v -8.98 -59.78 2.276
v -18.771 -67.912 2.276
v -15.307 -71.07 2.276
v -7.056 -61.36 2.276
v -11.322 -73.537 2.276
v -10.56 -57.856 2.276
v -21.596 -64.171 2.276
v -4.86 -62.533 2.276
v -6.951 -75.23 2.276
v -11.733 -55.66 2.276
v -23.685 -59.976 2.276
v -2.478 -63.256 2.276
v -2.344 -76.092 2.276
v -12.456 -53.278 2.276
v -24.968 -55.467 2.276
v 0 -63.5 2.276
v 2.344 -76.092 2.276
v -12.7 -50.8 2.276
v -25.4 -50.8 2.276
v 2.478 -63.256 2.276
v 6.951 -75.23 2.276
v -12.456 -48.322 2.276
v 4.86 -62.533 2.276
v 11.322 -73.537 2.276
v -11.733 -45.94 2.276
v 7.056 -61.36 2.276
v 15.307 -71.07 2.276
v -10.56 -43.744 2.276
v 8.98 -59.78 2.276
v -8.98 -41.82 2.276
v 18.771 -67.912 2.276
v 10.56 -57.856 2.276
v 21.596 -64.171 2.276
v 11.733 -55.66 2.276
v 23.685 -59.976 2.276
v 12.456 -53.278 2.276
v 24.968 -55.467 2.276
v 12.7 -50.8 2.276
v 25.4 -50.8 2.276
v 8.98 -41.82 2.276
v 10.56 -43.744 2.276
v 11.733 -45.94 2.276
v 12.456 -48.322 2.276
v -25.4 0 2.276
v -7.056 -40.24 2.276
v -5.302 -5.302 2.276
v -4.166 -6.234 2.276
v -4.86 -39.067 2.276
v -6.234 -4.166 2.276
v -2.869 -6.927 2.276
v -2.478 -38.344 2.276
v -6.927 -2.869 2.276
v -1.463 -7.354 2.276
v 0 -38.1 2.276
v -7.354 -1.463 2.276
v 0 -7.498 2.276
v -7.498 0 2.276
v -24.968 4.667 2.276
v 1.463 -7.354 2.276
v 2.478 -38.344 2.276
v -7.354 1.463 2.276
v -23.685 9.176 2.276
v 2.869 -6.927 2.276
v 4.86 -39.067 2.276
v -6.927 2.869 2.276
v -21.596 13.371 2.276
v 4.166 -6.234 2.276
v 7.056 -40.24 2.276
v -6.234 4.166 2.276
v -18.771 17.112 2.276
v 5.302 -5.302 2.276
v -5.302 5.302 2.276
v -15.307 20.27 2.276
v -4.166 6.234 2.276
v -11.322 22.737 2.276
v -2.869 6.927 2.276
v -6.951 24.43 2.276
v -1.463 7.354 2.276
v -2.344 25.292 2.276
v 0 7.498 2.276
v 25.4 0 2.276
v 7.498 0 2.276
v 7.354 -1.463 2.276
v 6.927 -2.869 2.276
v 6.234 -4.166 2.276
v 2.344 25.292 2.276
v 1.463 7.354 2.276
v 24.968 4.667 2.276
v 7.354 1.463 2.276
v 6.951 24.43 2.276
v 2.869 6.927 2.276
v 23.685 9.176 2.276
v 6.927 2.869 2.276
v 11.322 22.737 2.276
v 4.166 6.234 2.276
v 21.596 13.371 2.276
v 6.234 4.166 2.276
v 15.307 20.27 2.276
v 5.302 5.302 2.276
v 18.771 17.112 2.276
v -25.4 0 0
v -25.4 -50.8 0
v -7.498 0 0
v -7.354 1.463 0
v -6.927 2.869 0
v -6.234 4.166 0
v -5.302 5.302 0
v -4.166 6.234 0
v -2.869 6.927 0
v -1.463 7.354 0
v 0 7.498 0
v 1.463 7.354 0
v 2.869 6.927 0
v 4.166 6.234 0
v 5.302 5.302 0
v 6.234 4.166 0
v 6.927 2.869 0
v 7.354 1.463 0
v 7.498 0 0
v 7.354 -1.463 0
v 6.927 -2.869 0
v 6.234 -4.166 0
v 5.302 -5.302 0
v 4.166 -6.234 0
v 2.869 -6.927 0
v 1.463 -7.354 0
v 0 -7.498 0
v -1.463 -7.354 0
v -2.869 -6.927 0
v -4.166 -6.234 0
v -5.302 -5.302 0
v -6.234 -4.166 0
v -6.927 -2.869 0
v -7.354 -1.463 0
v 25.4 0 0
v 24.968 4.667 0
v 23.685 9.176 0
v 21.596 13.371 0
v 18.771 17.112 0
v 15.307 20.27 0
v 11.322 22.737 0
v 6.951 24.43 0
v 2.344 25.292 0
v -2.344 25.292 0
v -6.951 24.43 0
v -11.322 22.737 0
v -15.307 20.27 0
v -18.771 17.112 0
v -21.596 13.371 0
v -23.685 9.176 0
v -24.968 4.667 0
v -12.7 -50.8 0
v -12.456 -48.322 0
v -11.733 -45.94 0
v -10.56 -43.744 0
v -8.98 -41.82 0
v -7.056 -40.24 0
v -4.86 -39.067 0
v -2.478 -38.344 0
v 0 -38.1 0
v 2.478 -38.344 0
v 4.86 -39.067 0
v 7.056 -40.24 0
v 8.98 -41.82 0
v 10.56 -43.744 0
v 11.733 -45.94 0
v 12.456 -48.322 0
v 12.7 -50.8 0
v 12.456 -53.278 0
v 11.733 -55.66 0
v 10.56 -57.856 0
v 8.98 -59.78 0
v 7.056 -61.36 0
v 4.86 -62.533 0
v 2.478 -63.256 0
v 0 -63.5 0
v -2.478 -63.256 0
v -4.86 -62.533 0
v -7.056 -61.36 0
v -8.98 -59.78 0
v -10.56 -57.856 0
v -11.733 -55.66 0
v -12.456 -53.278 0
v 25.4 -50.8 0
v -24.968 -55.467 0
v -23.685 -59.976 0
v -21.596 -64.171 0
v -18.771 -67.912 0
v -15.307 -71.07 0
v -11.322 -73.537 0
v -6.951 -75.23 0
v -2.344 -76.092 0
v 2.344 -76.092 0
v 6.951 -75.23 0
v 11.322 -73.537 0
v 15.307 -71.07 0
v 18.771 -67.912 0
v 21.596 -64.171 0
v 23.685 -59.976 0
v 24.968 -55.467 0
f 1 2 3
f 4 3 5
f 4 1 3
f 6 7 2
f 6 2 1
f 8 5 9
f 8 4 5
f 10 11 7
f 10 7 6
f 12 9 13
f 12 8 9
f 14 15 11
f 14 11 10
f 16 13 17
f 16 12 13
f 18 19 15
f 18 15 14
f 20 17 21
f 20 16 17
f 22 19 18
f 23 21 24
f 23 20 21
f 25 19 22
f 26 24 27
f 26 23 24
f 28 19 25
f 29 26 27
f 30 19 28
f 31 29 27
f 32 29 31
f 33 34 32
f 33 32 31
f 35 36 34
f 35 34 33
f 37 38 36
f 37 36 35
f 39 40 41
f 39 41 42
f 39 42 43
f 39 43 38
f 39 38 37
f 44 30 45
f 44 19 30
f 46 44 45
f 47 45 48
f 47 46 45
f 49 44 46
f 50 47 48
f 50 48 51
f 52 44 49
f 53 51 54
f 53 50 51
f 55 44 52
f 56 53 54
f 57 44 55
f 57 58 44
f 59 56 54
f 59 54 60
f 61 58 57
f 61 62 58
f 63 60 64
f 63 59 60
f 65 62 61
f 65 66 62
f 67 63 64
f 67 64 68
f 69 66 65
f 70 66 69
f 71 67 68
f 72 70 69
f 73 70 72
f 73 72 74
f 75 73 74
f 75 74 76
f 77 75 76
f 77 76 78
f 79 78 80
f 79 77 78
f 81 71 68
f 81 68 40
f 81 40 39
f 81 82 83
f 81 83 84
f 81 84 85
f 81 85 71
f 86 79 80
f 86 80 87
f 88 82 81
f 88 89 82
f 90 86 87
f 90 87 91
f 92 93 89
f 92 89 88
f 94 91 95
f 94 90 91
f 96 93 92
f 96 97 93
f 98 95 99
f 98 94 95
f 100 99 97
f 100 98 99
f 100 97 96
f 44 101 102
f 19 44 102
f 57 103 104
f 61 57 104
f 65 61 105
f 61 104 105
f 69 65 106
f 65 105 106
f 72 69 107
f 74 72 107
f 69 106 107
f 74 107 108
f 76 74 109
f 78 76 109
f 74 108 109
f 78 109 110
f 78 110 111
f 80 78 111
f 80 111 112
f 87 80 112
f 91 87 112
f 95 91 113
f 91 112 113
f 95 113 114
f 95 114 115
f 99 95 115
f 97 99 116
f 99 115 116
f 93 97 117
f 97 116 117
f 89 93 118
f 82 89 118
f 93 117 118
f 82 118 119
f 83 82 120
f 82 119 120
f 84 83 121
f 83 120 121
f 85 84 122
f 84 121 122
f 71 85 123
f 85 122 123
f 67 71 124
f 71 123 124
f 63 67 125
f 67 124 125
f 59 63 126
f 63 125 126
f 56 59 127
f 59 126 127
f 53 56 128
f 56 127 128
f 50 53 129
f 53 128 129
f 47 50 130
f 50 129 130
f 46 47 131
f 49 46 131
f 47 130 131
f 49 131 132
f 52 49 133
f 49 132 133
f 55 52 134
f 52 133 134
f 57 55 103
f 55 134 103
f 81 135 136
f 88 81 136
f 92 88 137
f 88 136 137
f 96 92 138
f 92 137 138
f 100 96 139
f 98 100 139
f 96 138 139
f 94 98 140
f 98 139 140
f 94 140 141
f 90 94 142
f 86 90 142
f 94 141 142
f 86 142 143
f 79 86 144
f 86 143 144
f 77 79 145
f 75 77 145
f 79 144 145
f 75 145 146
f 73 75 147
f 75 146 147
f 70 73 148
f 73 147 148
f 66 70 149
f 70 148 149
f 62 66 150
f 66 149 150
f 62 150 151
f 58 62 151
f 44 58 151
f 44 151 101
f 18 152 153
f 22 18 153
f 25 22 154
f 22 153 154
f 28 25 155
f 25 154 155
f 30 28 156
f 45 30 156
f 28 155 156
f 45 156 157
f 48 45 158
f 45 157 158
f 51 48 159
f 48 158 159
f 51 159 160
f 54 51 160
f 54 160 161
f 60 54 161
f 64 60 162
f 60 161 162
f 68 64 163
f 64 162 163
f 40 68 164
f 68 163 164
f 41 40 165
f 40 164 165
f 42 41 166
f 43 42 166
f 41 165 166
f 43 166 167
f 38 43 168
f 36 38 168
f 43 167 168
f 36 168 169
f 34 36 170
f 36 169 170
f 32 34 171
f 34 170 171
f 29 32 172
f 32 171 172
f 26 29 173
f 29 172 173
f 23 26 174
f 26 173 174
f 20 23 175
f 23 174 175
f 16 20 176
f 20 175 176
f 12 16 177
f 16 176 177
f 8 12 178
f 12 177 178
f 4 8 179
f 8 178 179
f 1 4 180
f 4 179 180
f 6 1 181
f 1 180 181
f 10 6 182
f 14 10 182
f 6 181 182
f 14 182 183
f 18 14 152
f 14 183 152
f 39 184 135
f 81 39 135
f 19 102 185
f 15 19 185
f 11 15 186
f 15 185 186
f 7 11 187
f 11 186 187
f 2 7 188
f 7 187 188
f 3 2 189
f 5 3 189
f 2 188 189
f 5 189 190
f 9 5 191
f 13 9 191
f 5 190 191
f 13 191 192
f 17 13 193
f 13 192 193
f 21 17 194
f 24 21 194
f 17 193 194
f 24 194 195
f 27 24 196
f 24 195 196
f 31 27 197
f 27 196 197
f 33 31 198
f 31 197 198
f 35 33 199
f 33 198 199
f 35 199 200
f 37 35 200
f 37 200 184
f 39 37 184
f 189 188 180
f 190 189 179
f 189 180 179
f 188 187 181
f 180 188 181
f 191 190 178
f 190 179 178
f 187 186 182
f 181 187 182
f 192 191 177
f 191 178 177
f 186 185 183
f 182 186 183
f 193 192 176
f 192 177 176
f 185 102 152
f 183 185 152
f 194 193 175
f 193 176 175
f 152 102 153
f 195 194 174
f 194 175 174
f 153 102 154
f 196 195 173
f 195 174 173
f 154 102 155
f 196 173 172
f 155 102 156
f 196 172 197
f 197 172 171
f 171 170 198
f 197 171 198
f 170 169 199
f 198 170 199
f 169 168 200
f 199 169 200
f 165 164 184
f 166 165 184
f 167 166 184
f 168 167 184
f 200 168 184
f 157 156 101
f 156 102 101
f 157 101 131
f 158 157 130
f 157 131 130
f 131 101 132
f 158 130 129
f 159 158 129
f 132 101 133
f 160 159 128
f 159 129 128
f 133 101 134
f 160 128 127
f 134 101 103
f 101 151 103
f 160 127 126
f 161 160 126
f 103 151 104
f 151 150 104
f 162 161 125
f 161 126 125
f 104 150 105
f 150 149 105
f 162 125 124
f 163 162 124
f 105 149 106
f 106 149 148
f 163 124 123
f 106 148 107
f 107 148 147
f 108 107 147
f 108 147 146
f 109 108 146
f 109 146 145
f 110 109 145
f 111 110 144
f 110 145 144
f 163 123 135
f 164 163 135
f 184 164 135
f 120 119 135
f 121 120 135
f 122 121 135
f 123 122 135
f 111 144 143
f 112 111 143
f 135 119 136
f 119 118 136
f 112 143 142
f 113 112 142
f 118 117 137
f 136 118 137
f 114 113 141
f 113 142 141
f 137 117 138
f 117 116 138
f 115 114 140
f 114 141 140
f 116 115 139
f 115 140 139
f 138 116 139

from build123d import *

# Parameters (mm, degrees)
BOSS_EXTRUDE1_DEPTH = 2.276130482


with BuildPart() as part:
    # Sketch1 → Boss-Extrude1 (new body)
    with BuildSketch(Plane.XY):
        with BuildLine():
            ThreePointArc((-7.498149452, 0), (0, 7.498149452), (7.498149452, 0))
            Line((7.498149452, 0), (25.4, 0))
            ThreePointArc((25.4, 0), (0, 25.4), (-25.4, 0))
            Line((-25.4, 0), (-7.498149452, 0))
        make_face()
        with BuildLine():
            Line((25.4, 0), (7.498149452, 0))
            ThreePointArc((7.498149452, 0), (0, -7.498149452), (-7.498149452, 0))
            Line((-7.498149452, 0), (-25.4, 0))
            ThreePointArc((-25.4, 0), (-17.960512225, -17.960512259), (4.9e-08, -25.4))
            ThreePointArc((4.9e-08, -25.4), (17.960512259, -17.960512225), (25.4, 0))
        make_face()
        with BuildLine():
            Line((25.4, -50.8), (25.4, 0))
            ThreePointArc((25.4, 0), (17.960512259, -17.960512225), (4.9e-08, -25.4))
            ThreePointArc((4.9e-08, -25.4), (17.960512259, -32.839487775), (25.4, -50.8))
        make_face()
        with BuildLine():
            ThreePointArc((4.9e-08, -25.4), (-17.960512225, -17.960512259), (-25.4, 0))
            Line((-25.4, 0), (-25.4, -50.8))
            ThreePointArc((-25.4, -50.8), (-17.960512225, -32.839487741), (4.9e-08, -25.4))
        make_face()
        with BuildLine():
            ThreePointArc((-25.4, -50.8), (0, -76.2), (25.4, -50.8))
            Line((25.4, -50.8), (12.7, -50.8))
            ThreePointArc((12.7, -50.8), (0, -63.5), (-12.7, -50.8))
            Line((-12.7, -50.8), (-25.4, -50.8))
        make_face()
        with BuildLine():
            Line((12.7, -50.8), (25.4, -50.8))
            ThreePointArc((25.4, -50.8), (17.960512259, -32.839487775), (4.9e-08, -25.4))
            ThreePointArc((4.9e-08, -25.4), (-17.960512225, -32.839487741), (-25.4, -50.8))
            Line((-25.4, -50.8), (-12.7, -50.8))
            ThreePointArc((-12.7, -50.8), (0, -38.1), (12.7, -50.8))
        make_face()
    extrude(amount=BOSS_EXTRUDE1_DEPTH)


solid = part.part
